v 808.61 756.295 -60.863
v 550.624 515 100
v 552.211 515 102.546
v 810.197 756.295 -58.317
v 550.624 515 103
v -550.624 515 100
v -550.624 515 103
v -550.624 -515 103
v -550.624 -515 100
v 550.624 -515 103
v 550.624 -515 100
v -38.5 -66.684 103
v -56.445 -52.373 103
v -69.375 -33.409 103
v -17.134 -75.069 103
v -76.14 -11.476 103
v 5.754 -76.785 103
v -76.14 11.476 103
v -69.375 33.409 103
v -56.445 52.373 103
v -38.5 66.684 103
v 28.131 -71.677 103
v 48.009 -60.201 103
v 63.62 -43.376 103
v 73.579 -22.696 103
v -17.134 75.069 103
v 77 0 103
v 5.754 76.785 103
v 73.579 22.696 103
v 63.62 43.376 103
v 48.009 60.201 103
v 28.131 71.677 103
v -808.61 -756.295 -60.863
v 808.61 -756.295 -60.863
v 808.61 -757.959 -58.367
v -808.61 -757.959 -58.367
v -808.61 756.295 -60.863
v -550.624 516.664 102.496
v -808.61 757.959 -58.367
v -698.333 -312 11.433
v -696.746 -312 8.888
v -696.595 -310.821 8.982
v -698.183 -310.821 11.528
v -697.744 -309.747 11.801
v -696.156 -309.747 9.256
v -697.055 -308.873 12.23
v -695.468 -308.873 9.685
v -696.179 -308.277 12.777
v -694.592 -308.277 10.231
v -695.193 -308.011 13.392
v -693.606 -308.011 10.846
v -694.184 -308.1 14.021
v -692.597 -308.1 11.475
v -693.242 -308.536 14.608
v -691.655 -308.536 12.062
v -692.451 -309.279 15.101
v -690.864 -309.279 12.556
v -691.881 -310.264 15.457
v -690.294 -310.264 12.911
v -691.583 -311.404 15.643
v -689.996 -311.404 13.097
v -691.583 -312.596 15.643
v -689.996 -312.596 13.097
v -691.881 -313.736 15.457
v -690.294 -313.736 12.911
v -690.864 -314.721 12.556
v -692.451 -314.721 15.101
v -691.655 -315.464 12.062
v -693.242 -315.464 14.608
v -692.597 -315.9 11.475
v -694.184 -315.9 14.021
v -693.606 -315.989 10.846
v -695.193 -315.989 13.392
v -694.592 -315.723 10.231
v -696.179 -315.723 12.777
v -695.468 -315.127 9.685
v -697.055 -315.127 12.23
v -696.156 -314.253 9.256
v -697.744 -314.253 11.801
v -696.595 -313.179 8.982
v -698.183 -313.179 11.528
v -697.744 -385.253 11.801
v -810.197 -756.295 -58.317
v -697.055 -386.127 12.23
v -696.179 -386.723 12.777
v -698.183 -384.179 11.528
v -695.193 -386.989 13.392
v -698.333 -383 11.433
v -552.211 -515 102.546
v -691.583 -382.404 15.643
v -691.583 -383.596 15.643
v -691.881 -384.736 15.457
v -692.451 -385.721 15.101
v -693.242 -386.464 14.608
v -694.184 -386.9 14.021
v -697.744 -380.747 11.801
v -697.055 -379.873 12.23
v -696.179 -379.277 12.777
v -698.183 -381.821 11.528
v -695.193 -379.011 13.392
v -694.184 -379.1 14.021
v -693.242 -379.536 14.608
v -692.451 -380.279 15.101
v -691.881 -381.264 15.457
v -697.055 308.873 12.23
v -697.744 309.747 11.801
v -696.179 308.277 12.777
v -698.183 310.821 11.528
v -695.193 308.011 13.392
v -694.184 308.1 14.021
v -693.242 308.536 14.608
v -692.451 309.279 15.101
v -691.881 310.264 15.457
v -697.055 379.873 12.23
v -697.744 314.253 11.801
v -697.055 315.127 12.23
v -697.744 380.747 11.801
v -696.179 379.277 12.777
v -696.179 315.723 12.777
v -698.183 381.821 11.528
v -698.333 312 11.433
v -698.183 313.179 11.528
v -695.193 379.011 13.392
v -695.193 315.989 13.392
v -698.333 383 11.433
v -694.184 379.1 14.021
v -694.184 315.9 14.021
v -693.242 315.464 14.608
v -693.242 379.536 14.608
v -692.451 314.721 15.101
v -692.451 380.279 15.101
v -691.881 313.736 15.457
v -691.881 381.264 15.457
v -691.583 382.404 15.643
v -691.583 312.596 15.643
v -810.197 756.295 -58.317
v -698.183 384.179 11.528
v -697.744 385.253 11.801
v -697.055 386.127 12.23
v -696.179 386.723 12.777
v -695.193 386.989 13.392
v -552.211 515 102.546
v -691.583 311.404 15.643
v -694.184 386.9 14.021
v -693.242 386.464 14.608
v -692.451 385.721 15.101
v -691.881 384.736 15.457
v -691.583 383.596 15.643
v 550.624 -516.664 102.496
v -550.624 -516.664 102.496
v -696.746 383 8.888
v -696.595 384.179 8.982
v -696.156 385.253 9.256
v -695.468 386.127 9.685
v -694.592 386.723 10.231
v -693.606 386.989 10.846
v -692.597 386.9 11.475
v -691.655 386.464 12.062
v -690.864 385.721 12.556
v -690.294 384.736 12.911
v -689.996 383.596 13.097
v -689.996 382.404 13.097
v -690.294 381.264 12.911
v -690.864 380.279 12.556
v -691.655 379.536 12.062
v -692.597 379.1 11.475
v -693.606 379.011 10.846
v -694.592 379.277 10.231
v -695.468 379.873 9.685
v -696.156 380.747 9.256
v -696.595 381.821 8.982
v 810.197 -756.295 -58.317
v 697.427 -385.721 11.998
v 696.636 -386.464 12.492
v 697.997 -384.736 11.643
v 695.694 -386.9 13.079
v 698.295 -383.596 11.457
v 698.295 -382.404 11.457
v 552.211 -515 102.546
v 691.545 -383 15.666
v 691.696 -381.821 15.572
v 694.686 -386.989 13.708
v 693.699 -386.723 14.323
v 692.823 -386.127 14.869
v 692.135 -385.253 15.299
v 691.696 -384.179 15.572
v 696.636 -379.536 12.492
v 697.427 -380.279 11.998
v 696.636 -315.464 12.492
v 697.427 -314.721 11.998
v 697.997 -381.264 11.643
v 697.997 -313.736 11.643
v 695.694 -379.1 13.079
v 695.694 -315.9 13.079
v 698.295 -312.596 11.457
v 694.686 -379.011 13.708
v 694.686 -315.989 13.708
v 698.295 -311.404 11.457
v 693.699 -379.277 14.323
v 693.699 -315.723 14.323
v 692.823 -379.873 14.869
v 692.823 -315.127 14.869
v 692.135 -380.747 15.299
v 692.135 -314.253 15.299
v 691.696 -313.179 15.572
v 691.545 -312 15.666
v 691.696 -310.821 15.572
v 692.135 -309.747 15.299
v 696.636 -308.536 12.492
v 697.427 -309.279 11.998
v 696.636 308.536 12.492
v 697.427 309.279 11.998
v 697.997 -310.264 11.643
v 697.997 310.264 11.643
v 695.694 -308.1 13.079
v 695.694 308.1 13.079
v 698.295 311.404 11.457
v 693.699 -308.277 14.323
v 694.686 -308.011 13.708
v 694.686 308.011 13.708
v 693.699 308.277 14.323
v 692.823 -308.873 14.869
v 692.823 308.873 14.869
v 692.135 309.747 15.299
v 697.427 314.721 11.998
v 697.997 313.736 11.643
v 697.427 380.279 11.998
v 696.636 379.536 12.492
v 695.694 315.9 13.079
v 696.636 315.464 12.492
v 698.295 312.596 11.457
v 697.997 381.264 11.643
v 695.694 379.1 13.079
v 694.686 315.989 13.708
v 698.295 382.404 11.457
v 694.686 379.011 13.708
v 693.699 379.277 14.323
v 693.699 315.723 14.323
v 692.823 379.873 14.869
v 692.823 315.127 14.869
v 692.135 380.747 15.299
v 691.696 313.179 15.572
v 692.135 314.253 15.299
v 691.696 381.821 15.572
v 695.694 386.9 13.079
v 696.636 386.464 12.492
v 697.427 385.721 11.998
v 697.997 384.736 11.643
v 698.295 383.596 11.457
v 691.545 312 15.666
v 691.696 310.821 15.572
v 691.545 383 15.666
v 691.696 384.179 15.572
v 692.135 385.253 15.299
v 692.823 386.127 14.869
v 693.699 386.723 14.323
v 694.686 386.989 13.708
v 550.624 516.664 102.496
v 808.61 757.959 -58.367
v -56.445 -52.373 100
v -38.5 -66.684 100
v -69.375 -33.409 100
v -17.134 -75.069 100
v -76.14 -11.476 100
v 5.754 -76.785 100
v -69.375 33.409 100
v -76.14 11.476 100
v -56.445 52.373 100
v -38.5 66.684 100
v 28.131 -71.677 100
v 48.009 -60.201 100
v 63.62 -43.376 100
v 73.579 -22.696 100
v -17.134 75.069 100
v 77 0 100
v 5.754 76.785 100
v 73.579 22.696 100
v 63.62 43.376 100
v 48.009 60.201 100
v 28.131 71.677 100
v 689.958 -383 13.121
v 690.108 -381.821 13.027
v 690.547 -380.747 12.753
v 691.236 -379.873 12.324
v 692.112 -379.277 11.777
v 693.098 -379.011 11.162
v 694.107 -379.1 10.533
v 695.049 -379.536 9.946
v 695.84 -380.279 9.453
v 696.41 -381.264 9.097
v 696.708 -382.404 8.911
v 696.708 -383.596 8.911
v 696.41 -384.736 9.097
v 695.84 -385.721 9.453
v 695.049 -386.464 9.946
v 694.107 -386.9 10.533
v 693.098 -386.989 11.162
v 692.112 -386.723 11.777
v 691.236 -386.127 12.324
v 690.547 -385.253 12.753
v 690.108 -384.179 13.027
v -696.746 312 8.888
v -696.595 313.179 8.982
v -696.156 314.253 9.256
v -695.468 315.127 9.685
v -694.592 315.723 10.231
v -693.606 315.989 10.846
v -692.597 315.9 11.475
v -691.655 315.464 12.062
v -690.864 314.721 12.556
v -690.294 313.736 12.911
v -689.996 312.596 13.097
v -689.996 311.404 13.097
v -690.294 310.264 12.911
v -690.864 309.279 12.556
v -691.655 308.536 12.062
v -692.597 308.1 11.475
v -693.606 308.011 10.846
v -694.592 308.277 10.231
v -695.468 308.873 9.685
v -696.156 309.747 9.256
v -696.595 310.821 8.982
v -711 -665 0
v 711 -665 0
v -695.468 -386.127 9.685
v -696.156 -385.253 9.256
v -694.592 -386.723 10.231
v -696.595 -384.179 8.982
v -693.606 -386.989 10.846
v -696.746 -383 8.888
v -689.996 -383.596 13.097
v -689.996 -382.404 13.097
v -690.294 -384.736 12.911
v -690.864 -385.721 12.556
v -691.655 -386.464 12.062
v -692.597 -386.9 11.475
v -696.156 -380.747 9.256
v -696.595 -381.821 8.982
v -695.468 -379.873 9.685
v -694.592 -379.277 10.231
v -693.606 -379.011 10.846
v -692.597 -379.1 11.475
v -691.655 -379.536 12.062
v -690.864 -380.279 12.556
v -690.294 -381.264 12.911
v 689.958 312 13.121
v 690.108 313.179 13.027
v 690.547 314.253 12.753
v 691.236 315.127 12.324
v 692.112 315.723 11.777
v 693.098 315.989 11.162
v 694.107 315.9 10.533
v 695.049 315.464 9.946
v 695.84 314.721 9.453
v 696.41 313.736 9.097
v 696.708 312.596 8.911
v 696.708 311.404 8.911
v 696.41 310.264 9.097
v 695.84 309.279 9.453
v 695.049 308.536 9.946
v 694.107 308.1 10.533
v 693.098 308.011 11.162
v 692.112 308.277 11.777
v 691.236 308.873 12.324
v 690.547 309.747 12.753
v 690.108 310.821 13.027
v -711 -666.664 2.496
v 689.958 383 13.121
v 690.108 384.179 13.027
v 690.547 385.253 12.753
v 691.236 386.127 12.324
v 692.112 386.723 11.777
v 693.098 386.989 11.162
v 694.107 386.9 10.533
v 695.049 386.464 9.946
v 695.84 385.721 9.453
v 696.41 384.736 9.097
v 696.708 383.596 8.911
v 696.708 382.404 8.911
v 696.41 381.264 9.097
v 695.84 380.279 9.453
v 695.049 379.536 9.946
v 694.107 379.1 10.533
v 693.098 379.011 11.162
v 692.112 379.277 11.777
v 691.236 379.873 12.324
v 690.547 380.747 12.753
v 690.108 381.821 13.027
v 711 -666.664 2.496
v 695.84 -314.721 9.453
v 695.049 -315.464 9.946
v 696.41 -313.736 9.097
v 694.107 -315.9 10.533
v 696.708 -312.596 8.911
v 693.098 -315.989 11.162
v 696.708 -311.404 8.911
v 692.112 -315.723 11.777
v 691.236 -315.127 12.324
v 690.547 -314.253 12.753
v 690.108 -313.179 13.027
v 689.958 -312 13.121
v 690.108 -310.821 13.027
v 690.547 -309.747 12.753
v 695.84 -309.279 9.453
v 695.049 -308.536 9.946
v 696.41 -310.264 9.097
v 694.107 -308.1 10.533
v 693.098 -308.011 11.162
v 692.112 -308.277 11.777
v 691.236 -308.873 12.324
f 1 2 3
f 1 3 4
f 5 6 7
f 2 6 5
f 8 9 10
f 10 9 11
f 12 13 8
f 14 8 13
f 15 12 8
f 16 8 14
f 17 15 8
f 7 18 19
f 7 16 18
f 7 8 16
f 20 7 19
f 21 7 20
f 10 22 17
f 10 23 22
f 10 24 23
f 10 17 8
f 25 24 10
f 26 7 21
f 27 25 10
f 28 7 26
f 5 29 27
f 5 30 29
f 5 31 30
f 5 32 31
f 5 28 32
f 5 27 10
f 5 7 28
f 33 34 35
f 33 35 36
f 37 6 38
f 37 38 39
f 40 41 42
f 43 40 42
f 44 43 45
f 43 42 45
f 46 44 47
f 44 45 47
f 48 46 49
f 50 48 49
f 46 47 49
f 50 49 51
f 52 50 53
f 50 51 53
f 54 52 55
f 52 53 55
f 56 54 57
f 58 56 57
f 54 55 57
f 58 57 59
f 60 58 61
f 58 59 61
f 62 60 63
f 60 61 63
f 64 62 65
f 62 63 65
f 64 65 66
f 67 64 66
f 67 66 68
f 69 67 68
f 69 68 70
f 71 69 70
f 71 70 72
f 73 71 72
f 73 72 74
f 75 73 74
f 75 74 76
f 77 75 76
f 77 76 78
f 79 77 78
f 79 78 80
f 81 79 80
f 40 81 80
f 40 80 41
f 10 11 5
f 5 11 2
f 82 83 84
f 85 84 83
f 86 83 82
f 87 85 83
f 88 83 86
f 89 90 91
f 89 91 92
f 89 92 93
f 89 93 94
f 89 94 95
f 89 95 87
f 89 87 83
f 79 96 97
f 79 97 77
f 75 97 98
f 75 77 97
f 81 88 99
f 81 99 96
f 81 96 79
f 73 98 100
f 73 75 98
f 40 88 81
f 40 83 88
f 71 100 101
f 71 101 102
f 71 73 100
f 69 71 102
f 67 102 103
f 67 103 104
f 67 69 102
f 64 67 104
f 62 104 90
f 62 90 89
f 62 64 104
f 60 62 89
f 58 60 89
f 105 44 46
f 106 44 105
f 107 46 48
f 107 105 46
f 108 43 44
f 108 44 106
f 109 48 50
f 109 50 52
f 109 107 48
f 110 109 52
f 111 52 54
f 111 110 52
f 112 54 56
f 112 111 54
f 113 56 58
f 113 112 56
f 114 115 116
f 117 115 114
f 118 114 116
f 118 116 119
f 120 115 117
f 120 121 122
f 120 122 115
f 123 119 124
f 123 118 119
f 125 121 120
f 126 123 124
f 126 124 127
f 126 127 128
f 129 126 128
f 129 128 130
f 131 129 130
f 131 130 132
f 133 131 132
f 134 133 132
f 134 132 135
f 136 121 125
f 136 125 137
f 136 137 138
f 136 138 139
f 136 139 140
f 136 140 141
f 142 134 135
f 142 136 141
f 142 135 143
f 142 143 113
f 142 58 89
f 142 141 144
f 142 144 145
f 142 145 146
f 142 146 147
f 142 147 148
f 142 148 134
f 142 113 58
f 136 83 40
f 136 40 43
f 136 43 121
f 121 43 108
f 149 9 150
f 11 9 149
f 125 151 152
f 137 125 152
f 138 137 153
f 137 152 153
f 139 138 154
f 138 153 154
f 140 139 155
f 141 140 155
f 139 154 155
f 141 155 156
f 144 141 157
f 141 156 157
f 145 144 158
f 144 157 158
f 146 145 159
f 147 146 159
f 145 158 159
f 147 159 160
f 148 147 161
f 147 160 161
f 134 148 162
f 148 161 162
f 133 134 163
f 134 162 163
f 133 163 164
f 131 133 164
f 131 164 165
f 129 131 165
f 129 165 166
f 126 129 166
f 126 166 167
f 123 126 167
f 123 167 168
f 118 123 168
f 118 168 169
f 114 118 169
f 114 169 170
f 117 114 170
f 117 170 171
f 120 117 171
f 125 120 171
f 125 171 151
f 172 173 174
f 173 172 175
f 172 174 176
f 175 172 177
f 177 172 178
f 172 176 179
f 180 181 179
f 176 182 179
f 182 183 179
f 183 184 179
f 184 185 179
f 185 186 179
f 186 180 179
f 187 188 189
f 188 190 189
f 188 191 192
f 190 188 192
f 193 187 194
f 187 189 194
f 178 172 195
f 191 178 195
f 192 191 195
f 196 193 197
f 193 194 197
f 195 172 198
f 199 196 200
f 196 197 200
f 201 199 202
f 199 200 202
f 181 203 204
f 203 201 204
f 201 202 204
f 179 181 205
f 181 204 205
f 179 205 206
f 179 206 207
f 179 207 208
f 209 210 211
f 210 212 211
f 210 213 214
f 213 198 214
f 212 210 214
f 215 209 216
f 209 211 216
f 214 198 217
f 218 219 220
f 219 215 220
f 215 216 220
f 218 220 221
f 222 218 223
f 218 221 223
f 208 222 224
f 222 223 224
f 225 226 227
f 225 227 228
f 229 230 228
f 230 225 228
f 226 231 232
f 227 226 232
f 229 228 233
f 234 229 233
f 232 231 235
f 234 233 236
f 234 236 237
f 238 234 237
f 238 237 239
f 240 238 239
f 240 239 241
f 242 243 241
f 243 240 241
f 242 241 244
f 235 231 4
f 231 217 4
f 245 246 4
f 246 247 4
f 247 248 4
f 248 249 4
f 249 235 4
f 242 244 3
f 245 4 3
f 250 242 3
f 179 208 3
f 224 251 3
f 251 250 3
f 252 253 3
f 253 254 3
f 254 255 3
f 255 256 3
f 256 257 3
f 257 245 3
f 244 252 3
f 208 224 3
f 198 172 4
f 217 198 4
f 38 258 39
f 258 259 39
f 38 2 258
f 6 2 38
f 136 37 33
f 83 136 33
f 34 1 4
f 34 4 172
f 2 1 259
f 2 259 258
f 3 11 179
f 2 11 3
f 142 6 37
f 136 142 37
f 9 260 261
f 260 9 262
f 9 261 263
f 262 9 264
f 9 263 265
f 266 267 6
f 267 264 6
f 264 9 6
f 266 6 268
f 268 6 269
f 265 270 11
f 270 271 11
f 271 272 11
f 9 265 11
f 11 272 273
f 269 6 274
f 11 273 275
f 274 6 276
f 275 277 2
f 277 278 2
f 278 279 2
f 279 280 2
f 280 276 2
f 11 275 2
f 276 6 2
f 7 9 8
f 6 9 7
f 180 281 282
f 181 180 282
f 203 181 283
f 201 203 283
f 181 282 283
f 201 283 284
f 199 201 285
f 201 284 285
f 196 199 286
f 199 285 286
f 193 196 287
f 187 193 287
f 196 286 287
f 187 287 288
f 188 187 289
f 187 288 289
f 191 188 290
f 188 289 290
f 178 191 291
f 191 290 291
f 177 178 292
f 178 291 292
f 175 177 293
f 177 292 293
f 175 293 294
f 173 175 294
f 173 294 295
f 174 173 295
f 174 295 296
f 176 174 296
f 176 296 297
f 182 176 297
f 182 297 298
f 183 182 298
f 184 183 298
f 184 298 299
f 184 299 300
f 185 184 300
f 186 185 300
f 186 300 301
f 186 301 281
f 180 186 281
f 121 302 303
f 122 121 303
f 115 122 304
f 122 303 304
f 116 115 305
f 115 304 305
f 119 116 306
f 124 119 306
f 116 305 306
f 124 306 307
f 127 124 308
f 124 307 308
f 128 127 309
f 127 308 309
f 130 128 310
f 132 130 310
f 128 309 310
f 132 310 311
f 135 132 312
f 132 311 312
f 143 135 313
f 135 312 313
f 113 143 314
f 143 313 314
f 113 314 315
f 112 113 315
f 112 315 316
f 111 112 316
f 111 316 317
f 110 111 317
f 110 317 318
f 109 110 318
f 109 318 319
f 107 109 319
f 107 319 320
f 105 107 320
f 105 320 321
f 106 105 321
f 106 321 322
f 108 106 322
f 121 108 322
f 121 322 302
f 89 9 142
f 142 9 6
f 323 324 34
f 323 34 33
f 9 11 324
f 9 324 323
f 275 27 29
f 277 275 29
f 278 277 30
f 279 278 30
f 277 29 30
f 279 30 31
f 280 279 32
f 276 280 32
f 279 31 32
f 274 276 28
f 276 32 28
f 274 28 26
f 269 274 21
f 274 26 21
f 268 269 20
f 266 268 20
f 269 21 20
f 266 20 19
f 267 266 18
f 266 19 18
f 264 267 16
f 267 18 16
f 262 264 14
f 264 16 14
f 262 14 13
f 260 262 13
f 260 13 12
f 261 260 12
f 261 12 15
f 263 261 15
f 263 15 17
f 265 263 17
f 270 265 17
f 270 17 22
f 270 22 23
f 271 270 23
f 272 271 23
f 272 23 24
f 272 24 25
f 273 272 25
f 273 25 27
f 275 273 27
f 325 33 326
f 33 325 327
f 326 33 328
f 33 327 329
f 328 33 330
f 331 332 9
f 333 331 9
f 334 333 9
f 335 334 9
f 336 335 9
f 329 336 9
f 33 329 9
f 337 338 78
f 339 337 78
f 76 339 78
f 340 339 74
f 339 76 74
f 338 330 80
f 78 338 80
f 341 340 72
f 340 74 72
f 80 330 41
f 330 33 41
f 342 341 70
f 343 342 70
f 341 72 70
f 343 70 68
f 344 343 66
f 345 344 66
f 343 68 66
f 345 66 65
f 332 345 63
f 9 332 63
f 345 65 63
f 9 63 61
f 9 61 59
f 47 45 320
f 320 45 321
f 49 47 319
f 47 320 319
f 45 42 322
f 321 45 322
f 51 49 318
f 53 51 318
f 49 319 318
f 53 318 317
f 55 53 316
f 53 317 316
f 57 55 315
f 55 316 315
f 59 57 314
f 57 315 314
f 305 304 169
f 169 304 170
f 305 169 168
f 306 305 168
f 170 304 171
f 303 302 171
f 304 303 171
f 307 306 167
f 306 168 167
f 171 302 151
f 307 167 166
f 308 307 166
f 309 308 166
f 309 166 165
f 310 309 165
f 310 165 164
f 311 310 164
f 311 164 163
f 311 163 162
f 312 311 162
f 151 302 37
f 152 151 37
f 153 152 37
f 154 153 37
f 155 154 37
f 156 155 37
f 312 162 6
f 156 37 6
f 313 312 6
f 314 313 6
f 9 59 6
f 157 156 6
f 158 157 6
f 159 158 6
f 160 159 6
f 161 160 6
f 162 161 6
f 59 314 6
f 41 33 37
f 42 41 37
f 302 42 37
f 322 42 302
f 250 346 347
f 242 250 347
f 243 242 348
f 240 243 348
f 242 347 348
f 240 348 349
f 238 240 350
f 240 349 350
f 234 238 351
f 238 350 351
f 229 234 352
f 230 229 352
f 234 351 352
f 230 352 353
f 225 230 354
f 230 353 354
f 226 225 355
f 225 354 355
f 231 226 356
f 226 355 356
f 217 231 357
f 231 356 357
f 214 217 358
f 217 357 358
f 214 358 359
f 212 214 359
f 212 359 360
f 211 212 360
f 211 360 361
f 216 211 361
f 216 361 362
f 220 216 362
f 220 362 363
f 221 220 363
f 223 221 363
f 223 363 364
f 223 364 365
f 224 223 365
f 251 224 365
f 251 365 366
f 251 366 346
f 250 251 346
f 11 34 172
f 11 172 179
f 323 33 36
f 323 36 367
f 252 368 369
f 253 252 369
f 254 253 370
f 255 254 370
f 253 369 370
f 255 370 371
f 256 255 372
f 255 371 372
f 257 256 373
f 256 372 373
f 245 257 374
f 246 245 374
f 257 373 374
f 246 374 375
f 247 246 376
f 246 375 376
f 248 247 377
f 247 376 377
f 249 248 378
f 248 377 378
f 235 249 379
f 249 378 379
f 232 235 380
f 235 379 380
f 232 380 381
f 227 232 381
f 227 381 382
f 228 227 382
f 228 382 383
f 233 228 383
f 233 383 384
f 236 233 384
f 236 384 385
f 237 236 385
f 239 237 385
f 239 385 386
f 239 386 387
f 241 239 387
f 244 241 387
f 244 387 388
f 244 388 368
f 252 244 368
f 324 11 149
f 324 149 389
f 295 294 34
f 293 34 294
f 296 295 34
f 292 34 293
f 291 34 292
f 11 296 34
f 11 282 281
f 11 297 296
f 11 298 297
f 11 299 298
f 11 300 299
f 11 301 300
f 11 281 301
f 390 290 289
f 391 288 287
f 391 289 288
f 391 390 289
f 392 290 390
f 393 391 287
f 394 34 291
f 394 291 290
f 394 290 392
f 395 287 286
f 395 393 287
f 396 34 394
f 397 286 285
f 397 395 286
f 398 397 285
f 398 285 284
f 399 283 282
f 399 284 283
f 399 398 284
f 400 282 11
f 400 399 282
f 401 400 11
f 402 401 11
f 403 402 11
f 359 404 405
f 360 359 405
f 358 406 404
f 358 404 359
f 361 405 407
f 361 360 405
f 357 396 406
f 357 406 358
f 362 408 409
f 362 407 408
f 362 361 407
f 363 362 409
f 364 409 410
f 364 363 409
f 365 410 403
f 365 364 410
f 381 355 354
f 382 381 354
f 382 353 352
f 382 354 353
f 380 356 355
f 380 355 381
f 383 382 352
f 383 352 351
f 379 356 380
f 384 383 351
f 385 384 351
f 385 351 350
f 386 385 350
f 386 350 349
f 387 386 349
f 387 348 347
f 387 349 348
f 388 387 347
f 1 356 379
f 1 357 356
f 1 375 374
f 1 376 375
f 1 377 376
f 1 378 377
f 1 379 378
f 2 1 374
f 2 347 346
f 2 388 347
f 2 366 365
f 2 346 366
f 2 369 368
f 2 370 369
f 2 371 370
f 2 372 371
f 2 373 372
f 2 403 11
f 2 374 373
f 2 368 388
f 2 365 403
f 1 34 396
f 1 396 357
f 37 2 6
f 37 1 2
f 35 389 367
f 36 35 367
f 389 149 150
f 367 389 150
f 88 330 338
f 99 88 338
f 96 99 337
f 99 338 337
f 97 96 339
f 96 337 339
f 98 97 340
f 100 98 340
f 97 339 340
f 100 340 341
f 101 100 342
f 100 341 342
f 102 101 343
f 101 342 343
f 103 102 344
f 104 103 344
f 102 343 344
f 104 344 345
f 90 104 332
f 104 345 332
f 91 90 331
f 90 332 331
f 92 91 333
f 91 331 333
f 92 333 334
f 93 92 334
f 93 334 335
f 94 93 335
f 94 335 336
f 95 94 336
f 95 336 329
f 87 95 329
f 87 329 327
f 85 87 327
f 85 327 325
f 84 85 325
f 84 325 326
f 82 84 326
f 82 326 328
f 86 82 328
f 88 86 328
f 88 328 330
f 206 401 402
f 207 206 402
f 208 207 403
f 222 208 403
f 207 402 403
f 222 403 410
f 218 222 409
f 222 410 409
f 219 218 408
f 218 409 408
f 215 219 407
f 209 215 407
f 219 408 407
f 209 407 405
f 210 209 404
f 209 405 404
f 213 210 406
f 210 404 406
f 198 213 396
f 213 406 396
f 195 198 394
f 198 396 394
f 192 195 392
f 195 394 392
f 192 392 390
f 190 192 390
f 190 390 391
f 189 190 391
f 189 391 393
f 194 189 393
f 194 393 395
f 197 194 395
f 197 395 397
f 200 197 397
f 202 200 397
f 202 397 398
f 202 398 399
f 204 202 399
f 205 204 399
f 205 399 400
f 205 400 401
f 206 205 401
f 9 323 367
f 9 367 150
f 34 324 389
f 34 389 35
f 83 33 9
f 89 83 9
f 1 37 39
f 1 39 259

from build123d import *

# Parameters (mm, degrees)
BOSS_EXTRUDE1_DEPTH = 3
BOSS_EXTRUDE2_DEPTH = 3
BOSS_EXTRUDE3_DEPTH = 3
BOSS_EXTRUDE4_DEPTH = 3
SKETCH7_W           = 1101.2481203
SKETCH7_H           = 1030
BOSS_EXTRUDE5_DEPTH = 3
SKETCH9_R           = 4
CUT_EXTRUDE2_DEPTH  = 1319.156436785
SKETCH10_R          = 4
CUT_EXTRUDE3_DEPTH  = 1319.156436785
SKETCH11_R          = 77
CUT_EXTRUDE4_DEPTH  = 1122.504200496


with BuildPart() as part:
    # Sketch3 → Boss-Extrude1 (new body)
    with BuildSketch(Plane(origin=(0, -204.615384615, 306.923076923), x_dir=(1, 0, 0), z_dir=(0, -0.554700196225229, 0.8320502943378437))):
        Polygon((-550.62406015, -373.035881961), (550.62406015, -373.035881961), (711, -553.313445735), (808.609699533, -663.035881961), (-808.609699533, -663.035881961), (-711, -553.313445735), align=None)
    extrude(amount=BOSS_EXTRUDE1_DEPTH)


with BuildPart() as body_2:
    # Sketch4 → Boss-Extrude2 (new body)
    with BuildSketch(Plane(origin=(-199.04568884, 0, 319.221394207), x_dir=(-0.8485565730164447, 0, -0.5291046610932351), z_dir=(0.5291046610932351, 0, -0.8485565730164447))):
        Polygon((414.325199392, -515), (414.325199392, 515), (718.354002641, 756.294585358), (718.354002641, -756.294585358), align=None)
    extrude(amount=-BOSS_EXTRUDE2_DEPTH)

    # Sketch10 → Cut-Extrude3 (cut, through all)
    with BuildSketch(Plane(origin=(-199.04568884, 0, 319.221394207), x_dir=(-0.8485565730164447, 0, -0.5291046610932351), z_dir=(0.5291046610932351, 0, -0.8485565730164447))):
        with Locations((582.525895377, -383)):
            Circle(SKETCH10_R)
        with Locations((582.525895377, -312)):
            Circle(SKETCH10_R)
        with Locations((582.525895377, 312)):
            Circle(SKETCH10_R)
        with Locations((582.525895377, 383)):
            Circle(SKETCH10_R)
    extrude(amount=-CUT_EXTRUDE3_DEPTH, mode=Mode.SUBTRACT)


with BuildPart() as body_3:
    # Sketch5 → Boss-Extrude3 (new body)
    with BuildSketch(Plane(origin=(199.04568884, 0, 319.221394207), x_dir=(0.8485565730164449, 0, -0.5291046610932348), z_dir=(0.5291046610932347, 0, 0.8485565730164448))):
        Polygon((414.325199392, -515), (414.325199392, 515), (718.354002641, 756.294585358), (718.354002641, -756.294585358), align=None)
    extrude(amount=BOSS_EXTRUDE3_DEPTH)

    # Sketch9 → Cut-Extrude2 (cut, through all)
    with BuildSketch(Plane(origin=(199.04568884, 0, 319.221394207), x_dir=(-0.8485565730164449, 0, 0.5291046610932348), z_dir=(-0.5291046610932347, 0, -0.8485565730164448))):
        with Locations((-582.525895377, 383)):
            Circle(SKETCH9_R)
        with Locations((-582.525895377, 312)):
            Circle(SKETCH9_R)
        with Locations((-582.525895377, -312)):
            Circle(SKETCH9_R)
        with Locations((-582.525895377, -383)):
            Circle(SKETCH9_R)
    extrude(amount=-CUT_EXTRUDE2_DEPTH, mode=Mode.SUBTRACT)


with BuildPart() as body_4:
    # Sketch6 → Boss-Extrude4 (new body)
    with BuildSketch(Plane(origin=(0, 204.615384615, 306.923076923), x_dir=(-1, 0, 0), z_dir=(0, -0.554700196225229, -0.8320502943378437))):
        Polygon((-550.62406015, 373.035881961), (550.62406015, 373.035881961), (808.609699533, 663.035881961), (-808.609699533, 663.035881961), align=None)
    extrude(amount=-BOSS_EXTRUDE4_DEPTH)


with BuildPart() as body_5:
    # Sketch7 → Boss-Extrude5 (new body)
    with BuildSketch(Plane.XY.offset(100)):
        Rectangle(SKETCH7_W, SKETCH7_H)
    extrude(amount=BOSS_EXTRUDE5_DEPTH)

    # Sketch11 → Cut-Extrude4 (cut, through all)
    with BuildSketch(Plane.XY.offset(103)):
        Circle(SKETCH11_R)
    extrude(amount=-CUT_EXTRUDE4_DEPTH, mode=Mode.SUBTRACT)


solid = Compound([part.part, body_2.part, body_3.part, body_4.part, body_5.part])
